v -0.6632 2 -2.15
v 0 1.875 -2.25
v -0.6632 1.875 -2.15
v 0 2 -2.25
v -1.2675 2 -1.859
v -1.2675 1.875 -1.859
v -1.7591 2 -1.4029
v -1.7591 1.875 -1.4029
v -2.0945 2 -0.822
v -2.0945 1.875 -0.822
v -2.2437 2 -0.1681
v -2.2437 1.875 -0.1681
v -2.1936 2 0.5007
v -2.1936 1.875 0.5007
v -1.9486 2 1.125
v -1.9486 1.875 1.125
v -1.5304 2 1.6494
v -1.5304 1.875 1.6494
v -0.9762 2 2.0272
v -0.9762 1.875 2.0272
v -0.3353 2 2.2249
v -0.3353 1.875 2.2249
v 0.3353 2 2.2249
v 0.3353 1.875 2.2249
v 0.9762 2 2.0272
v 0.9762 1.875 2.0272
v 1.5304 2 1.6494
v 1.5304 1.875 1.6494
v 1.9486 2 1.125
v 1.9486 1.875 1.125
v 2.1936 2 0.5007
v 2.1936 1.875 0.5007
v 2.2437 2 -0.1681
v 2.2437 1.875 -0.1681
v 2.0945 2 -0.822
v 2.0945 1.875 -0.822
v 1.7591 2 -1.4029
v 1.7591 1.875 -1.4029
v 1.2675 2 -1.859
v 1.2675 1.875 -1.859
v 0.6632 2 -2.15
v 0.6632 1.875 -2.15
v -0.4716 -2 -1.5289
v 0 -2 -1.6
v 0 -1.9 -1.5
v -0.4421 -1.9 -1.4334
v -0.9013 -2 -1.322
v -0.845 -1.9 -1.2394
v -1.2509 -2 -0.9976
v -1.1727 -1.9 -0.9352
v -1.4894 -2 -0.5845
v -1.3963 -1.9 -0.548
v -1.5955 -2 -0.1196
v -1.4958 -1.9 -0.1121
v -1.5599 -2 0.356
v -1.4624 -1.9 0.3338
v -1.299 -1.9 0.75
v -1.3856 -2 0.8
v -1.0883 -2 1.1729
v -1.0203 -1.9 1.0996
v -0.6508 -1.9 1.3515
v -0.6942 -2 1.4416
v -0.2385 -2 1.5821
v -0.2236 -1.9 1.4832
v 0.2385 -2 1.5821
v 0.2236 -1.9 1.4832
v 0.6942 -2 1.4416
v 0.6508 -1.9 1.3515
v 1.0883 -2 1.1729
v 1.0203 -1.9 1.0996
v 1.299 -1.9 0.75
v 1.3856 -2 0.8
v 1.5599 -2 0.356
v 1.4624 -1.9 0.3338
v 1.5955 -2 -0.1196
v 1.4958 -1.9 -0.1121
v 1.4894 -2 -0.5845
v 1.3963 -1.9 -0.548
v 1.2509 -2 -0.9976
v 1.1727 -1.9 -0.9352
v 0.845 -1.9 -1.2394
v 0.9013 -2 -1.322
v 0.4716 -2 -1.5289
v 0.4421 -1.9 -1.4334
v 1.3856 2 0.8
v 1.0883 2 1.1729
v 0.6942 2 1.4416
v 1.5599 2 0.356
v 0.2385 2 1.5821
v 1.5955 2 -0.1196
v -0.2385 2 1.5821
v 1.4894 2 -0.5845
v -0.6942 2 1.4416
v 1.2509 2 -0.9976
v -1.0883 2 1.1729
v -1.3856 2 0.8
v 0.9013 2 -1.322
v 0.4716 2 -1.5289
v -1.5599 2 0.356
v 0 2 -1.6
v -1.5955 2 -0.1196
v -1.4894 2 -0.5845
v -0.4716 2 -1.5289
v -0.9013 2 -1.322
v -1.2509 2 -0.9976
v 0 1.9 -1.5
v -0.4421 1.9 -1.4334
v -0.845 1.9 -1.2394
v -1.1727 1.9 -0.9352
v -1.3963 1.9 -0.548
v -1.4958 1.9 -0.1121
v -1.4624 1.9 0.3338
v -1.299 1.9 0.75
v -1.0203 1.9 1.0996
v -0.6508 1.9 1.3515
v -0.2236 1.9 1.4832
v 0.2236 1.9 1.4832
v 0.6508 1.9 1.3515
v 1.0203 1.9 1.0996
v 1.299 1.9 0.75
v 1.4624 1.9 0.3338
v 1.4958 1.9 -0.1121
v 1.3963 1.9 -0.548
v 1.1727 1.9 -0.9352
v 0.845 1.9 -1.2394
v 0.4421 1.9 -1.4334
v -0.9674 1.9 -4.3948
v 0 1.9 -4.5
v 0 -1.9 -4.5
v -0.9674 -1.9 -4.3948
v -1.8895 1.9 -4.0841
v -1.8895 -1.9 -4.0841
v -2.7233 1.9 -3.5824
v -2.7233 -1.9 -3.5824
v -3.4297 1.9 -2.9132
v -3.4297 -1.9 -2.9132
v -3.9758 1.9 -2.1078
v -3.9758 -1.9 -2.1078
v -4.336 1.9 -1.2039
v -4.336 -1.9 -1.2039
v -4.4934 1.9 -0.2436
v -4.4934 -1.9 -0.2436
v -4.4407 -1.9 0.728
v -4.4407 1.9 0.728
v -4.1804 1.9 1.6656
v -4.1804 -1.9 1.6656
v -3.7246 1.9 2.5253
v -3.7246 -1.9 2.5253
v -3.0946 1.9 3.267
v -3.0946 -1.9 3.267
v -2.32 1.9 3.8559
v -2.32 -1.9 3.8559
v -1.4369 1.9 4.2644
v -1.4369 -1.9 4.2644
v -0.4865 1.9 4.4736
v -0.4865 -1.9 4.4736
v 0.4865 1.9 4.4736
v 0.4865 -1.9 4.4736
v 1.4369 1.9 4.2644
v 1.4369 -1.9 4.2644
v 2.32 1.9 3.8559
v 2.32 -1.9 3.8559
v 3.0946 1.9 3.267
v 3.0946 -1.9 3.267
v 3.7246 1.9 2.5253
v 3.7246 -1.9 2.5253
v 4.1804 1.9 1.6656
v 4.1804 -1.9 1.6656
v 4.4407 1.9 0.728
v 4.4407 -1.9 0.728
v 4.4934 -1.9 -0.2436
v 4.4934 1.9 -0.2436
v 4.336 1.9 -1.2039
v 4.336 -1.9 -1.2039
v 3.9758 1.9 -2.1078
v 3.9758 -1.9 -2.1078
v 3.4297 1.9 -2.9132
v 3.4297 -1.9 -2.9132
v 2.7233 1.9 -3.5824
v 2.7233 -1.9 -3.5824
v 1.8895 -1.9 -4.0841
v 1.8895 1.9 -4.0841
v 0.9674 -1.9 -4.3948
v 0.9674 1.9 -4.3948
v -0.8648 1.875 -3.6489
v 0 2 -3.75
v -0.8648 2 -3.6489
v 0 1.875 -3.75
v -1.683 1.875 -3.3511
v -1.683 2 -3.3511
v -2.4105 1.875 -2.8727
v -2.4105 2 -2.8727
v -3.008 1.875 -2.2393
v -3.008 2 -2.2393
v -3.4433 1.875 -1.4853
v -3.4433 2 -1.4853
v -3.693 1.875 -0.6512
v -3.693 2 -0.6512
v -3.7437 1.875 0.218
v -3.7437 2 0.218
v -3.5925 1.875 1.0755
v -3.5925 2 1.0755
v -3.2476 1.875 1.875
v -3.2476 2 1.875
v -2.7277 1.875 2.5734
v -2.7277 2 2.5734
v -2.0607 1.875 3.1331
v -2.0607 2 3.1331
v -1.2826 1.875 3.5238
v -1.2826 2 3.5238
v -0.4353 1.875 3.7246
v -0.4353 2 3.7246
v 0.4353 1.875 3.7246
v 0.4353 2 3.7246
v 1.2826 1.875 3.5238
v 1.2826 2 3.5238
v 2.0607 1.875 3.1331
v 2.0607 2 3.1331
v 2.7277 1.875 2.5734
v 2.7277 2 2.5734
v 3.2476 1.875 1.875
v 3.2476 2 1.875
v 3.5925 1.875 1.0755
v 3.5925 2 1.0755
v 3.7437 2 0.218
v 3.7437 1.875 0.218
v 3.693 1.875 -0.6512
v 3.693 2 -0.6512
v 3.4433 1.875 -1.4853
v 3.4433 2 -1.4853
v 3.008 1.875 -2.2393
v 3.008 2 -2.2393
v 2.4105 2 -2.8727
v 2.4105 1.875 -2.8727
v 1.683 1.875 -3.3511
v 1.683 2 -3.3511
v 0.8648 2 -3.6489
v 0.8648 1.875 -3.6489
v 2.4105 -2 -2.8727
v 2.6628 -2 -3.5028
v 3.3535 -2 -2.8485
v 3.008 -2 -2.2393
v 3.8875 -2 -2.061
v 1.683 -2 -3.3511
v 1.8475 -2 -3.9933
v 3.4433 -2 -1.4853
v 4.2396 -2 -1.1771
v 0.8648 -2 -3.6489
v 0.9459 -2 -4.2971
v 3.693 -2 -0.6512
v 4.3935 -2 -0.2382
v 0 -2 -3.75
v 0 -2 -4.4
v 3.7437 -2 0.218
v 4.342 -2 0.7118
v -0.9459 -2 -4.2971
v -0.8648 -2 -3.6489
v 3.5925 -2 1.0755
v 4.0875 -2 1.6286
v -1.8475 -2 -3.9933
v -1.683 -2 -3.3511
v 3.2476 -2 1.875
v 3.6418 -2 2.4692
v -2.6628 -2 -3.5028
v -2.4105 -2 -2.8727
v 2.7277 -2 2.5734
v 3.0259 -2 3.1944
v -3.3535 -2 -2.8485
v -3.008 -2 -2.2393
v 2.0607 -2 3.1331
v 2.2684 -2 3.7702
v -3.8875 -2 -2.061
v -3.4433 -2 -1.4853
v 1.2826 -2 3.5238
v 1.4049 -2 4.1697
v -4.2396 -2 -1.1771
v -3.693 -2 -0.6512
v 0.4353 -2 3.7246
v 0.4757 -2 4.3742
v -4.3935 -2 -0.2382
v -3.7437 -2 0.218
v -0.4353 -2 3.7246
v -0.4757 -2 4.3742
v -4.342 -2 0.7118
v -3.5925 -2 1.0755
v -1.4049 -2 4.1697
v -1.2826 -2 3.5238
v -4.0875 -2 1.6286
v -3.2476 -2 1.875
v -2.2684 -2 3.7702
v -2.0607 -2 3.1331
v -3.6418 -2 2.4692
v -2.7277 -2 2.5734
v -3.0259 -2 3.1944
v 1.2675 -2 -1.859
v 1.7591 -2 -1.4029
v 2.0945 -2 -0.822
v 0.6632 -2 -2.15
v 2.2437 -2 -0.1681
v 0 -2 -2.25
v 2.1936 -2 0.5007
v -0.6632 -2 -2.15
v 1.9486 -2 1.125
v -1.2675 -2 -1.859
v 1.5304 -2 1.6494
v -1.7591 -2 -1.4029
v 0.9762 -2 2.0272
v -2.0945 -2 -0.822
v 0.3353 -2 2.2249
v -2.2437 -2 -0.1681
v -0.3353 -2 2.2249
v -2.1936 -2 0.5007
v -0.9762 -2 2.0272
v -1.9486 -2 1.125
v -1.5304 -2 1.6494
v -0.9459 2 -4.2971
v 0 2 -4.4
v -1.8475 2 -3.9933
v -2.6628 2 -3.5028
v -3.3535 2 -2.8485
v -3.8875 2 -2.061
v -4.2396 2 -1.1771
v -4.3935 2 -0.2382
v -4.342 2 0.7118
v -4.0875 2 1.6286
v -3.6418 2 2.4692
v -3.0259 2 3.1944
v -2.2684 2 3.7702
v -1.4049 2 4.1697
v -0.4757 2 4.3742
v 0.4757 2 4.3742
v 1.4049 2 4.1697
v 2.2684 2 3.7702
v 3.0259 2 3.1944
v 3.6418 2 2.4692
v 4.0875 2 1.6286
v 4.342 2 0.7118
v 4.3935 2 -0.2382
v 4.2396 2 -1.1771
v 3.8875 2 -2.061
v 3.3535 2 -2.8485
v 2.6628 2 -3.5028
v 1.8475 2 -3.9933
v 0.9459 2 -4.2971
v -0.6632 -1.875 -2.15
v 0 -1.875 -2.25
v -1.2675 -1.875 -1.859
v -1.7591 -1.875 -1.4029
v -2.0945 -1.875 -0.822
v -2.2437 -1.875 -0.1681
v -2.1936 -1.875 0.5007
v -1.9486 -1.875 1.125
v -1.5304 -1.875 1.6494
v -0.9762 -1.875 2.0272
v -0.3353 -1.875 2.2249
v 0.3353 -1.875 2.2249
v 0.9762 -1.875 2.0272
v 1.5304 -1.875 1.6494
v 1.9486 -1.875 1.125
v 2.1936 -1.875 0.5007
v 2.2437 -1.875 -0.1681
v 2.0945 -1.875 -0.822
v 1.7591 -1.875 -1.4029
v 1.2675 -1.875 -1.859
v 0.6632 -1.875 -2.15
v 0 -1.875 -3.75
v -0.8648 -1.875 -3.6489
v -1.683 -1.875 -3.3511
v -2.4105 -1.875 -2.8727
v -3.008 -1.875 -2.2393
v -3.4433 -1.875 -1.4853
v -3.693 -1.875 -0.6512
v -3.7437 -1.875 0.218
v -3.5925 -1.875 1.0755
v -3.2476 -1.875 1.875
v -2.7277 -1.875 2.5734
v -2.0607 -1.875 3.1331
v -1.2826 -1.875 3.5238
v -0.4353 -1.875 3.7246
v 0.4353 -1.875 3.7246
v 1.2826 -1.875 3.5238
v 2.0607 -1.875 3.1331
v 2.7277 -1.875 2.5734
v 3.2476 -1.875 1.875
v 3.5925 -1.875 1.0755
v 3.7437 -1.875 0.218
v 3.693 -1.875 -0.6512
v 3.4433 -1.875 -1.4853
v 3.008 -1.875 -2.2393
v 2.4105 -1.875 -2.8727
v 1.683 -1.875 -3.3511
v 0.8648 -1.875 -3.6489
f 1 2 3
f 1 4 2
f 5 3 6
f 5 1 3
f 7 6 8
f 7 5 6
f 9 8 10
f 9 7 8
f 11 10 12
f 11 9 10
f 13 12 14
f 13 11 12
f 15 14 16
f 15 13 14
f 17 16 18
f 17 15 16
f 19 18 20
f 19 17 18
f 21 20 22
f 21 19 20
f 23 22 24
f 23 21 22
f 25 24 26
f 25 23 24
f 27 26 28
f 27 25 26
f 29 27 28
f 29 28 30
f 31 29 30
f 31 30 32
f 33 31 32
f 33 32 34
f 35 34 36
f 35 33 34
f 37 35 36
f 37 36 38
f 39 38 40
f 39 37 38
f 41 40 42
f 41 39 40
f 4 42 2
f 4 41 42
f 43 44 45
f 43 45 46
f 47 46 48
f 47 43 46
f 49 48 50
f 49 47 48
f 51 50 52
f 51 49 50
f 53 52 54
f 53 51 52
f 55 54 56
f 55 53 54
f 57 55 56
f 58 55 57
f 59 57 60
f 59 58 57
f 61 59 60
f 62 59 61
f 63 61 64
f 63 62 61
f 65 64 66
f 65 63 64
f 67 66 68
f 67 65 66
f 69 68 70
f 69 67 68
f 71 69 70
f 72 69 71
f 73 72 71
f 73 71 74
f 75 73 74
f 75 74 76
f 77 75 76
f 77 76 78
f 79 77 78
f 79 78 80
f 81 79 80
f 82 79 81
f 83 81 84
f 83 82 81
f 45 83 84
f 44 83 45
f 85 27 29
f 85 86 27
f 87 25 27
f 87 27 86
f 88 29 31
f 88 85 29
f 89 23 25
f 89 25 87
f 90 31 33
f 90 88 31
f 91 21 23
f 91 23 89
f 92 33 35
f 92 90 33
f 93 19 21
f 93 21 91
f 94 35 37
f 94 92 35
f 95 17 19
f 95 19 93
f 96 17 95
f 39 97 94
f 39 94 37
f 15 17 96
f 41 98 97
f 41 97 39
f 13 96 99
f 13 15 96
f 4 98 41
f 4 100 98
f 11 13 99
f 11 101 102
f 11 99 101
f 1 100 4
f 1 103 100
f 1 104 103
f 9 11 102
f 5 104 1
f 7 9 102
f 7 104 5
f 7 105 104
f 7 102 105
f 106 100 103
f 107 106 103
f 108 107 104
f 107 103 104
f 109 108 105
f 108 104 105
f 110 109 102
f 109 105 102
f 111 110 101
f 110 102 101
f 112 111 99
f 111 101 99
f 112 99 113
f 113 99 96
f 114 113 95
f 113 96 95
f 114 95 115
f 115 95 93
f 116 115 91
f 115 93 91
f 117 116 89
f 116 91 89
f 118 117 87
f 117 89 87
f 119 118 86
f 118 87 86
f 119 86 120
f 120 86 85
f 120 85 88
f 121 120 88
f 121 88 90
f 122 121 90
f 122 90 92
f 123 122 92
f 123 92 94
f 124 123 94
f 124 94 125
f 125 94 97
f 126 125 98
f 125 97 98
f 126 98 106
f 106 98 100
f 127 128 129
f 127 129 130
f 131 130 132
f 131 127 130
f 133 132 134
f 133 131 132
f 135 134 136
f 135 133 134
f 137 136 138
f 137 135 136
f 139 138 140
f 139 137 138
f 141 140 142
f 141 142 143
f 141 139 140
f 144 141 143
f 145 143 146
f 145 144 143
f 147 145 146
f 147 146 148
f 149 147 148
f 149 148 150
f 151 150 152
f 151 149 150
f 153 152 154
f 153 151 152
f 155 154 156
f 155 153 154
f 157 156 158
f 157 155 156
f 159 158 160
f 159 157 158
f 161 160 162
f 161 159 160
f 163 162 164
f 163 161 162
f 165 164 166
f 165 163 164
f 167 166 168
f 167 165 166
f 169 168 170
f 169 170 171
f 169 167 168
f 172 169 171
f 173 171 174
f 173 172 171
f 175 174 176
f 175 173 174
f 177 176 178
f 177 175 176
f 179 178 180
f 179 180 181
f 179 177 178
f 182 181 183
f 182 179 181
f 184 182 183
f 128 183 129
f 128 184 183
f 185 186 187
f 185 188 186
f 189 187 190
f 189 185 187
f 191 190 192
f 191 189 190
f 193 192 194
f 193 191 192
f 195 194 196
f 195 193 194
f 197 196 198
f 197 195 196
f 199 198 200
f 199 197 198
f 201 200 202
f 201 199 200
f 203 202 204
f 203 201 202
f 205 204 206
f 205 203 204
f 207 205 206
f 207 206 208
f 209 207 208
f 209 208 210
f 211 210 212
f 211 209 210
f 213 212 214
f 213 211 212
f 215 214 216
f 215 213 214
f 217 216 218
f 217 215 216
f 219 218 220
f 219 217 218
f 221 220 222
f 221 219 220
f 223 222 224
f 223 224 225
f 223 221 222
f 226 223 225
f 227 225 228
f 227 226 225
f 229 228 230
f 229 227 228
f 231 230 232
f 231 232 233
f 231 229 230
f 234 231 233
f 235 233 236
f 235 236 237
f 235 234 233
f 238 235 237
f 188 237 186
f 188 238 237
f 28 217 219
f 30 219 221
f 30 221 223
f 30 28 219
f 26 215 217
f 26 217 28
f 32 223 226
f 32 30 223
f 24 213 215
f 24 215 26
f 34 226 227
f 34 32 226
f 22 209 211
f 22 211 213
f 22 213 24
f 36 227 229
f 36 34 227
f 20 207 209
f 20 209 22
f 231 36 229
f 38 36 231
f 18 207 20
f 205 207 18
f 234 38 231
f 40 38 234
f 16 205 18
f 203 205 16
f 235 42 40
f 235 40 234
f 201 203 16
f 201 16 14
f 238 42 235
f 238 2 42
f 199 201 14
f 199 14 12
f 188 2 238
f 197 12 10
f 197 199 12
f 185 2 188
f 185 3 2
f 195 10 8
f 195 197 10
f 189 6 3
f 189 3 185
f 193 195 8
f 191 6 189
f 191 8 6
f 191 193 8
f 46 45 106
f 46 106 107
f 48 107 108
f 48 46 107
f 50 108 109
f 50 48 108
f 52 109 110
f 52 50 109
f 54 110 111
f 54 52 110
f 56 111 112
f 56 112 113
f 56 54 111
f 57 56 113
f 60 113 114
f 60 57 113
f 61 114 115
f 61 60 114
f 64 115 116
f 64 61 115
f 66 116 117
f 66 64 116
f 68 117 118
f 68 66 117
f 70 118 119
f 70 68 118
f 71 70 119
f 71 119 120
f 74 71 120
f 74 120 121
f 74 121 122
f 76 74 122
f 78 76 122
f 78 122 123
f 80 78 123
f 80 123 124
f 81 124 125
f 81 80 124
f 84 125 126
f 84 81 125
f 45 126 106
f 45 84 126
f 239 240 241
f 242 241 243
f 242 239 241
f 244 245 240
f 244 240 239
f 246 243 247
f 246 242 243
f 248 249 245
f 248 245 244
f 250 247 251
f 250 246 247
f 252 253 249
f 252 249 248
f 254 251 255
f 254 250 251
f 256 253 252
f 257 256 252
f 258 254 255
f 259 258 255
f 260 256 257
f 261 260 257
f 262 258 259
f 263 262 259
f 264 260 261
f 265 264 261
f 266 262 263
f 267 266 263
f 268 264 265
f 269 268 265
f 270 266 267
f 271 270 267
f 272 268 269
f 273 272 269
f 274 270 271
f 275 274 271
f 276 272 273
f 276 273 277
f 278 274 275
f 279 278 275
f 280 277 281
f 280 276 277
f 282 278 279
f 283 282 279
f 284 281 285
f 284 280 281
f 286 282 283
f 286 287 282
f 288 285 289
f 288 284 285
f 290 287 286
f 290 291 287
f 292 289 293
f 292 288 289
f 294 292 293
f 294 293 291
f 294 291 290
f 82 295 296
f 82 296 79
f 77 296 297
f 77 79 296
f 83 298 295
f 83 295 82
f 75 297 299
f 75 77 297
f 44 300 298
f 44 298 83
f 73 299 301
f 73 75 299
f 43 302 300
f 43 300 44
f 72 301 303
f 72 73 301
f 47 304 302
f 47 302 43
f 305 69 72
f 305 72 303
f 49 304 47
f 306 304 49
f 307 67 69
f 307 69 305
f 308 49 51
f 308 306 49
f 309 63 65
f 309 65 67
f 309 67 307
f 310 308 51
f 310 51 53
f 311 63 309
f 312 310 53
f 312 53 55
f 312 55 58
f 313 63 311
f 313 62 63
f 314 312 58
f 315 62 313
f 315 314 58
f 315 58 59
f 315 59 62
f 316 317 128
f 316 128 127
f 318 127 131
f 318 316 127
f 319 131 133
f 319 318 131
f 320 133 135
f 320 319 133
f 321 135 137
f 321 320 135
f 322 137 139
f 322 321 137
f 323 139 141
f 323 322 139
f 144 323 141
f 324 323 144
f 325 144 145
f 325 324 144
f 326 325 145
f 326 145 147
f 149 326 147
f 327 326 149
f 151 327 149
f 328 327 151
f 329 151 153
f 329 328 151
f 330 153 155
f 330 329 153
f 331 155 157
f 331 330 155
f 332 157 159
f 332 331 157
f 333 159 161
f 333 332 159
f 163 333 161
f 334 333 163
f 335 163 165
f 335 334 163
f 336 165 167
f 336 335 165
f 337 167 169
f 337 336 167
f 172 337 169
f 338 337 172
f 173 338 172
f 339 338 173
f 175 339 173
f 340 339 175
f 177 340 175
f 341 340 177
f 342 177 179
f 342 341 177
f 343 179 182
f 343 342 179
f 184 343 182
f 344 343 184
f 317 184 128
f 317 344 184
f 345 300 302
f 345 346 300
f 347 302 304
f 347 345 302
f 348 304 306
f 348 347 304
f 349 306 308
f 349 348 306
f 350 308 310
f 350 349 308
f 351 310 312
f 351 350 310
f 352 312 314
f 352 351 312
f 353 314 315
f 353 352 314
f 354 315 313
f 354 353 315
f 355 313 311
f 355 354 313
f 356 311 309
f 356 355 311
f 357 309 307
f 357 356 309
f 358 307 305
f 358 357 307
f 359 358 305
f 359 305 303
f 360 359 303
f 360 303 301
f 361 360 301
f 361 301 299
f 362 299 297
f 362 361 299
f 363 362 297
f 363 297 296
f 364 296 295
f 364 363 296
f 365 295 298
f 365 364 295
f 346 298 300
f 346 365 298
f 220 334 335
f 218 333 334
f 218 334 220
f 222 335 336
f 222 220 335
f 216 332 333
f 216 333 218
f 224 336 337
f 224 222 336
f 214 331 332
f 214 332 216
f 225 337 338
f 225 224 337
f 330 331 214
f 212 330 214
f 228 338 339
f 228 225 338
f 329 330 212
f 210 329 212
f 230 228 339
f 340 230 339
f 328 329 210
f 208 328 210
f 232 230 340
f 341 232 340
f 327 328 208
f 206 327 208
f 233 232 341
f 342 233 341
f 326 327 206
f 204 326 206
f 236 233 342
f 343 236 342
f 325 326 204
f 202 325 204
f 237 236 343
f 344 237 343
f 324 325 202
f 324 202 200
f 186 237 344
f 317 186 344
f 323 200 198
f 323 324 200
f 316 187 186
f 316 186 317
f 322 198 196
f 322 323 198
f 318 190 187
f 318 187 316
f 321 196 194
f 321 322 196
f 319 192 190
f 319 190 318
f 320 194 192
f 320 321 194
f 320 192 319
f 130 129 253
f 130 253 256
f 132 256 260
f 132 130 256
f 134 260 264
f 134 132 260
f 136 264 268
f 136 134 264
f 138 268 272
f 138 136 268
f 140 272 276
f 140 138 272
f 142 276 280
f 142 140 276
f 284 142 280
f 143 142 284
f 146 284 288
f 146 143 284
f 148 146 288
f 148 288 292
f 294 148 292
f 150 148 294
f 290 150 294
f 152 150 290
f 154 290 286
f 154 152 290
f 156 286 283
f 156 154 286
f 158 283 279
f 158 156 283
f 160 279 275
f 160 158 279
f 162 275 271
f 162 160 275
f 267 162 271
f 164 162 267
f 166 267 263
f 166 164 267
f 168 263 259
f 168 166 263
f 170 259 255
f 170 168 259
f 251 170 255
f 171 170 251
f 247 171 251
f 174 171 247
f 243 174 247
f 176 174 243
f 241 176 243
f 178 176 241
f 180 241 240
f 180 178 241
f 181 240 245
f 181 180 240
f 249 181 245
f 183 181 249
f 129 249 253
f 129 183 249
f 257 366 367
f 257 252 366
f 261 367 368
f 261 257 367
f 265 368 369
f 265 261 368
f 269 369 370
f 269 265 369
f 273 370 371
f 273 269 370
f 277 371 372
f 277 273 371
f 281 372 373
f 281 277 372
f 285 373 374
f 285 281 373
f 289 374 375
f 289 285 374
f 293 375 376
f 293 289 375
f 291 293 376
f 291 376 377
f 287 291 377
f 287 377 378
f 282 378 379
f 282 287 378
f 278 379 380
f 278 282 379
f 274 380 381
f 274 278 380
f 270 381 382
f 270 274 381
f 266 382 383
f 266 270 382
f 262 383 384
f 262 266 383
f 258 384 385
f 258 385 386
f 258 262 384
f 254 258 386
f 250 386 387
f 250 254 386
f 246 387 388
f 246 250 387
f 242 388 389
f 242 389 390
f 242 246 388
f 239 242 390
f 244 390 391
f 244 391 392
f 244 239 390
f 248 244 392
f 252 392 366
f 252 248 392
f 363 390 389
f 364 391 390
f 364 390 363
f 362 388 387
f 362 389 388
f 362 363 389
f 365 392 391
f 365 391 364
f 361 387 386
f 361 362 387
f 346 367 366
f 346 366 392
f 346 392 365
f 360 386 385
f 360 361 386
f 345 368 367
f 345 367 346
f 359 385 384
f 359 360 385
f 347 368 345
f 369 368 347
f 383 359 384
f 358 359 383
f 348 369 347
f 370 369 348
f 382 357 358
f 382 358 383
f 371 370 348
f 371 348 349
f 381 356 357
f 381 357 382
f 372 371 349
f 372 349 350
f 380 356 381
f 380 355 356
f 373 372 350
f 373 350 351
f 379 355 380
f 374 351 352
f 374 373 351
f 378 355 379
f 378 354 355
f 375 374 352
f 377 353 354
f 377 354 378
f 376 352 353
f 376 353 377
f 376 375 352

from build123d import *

# Parameters (mm, degrees)
CHAMFER1_SIZE = 0.1


with BuildPart() as part:
    # Sketch2 → Revolve1 (revolve)
    with BuildSketch(Plane.XY, mode=Mode.PRIVATE) as revolve1_sk:
        Polygon((1.5, 2), (1.5, -2), (2.25, -2), (2.25, -1.875), (3.75, -1.875), (3.75, -2), (4.5, -2), (4.5, 2), (3.75, 2), (3.75, 1.875), (2.25, 1.875), (2.25, 2), align=None)
    revolve(revolve1_sk.sketch.rotate(Axis((0, -2, 0), (0, 1, 0)), 90), axis=Axis((0, -2, 0), (0, 1, 0)))

    # Chamfer1
    chamfer1_edges = [part.edges().sort_by_distance(p)[0] for p in [
        (0, 2, 4.5),
        (0, -2, 4.5),
        (0, -2, 1.5),
        (0, 2, 1.5),
    ]]
    chamfer(chamfer1_edges, length=CHAMFER1_SIZE)


solid = part.part
